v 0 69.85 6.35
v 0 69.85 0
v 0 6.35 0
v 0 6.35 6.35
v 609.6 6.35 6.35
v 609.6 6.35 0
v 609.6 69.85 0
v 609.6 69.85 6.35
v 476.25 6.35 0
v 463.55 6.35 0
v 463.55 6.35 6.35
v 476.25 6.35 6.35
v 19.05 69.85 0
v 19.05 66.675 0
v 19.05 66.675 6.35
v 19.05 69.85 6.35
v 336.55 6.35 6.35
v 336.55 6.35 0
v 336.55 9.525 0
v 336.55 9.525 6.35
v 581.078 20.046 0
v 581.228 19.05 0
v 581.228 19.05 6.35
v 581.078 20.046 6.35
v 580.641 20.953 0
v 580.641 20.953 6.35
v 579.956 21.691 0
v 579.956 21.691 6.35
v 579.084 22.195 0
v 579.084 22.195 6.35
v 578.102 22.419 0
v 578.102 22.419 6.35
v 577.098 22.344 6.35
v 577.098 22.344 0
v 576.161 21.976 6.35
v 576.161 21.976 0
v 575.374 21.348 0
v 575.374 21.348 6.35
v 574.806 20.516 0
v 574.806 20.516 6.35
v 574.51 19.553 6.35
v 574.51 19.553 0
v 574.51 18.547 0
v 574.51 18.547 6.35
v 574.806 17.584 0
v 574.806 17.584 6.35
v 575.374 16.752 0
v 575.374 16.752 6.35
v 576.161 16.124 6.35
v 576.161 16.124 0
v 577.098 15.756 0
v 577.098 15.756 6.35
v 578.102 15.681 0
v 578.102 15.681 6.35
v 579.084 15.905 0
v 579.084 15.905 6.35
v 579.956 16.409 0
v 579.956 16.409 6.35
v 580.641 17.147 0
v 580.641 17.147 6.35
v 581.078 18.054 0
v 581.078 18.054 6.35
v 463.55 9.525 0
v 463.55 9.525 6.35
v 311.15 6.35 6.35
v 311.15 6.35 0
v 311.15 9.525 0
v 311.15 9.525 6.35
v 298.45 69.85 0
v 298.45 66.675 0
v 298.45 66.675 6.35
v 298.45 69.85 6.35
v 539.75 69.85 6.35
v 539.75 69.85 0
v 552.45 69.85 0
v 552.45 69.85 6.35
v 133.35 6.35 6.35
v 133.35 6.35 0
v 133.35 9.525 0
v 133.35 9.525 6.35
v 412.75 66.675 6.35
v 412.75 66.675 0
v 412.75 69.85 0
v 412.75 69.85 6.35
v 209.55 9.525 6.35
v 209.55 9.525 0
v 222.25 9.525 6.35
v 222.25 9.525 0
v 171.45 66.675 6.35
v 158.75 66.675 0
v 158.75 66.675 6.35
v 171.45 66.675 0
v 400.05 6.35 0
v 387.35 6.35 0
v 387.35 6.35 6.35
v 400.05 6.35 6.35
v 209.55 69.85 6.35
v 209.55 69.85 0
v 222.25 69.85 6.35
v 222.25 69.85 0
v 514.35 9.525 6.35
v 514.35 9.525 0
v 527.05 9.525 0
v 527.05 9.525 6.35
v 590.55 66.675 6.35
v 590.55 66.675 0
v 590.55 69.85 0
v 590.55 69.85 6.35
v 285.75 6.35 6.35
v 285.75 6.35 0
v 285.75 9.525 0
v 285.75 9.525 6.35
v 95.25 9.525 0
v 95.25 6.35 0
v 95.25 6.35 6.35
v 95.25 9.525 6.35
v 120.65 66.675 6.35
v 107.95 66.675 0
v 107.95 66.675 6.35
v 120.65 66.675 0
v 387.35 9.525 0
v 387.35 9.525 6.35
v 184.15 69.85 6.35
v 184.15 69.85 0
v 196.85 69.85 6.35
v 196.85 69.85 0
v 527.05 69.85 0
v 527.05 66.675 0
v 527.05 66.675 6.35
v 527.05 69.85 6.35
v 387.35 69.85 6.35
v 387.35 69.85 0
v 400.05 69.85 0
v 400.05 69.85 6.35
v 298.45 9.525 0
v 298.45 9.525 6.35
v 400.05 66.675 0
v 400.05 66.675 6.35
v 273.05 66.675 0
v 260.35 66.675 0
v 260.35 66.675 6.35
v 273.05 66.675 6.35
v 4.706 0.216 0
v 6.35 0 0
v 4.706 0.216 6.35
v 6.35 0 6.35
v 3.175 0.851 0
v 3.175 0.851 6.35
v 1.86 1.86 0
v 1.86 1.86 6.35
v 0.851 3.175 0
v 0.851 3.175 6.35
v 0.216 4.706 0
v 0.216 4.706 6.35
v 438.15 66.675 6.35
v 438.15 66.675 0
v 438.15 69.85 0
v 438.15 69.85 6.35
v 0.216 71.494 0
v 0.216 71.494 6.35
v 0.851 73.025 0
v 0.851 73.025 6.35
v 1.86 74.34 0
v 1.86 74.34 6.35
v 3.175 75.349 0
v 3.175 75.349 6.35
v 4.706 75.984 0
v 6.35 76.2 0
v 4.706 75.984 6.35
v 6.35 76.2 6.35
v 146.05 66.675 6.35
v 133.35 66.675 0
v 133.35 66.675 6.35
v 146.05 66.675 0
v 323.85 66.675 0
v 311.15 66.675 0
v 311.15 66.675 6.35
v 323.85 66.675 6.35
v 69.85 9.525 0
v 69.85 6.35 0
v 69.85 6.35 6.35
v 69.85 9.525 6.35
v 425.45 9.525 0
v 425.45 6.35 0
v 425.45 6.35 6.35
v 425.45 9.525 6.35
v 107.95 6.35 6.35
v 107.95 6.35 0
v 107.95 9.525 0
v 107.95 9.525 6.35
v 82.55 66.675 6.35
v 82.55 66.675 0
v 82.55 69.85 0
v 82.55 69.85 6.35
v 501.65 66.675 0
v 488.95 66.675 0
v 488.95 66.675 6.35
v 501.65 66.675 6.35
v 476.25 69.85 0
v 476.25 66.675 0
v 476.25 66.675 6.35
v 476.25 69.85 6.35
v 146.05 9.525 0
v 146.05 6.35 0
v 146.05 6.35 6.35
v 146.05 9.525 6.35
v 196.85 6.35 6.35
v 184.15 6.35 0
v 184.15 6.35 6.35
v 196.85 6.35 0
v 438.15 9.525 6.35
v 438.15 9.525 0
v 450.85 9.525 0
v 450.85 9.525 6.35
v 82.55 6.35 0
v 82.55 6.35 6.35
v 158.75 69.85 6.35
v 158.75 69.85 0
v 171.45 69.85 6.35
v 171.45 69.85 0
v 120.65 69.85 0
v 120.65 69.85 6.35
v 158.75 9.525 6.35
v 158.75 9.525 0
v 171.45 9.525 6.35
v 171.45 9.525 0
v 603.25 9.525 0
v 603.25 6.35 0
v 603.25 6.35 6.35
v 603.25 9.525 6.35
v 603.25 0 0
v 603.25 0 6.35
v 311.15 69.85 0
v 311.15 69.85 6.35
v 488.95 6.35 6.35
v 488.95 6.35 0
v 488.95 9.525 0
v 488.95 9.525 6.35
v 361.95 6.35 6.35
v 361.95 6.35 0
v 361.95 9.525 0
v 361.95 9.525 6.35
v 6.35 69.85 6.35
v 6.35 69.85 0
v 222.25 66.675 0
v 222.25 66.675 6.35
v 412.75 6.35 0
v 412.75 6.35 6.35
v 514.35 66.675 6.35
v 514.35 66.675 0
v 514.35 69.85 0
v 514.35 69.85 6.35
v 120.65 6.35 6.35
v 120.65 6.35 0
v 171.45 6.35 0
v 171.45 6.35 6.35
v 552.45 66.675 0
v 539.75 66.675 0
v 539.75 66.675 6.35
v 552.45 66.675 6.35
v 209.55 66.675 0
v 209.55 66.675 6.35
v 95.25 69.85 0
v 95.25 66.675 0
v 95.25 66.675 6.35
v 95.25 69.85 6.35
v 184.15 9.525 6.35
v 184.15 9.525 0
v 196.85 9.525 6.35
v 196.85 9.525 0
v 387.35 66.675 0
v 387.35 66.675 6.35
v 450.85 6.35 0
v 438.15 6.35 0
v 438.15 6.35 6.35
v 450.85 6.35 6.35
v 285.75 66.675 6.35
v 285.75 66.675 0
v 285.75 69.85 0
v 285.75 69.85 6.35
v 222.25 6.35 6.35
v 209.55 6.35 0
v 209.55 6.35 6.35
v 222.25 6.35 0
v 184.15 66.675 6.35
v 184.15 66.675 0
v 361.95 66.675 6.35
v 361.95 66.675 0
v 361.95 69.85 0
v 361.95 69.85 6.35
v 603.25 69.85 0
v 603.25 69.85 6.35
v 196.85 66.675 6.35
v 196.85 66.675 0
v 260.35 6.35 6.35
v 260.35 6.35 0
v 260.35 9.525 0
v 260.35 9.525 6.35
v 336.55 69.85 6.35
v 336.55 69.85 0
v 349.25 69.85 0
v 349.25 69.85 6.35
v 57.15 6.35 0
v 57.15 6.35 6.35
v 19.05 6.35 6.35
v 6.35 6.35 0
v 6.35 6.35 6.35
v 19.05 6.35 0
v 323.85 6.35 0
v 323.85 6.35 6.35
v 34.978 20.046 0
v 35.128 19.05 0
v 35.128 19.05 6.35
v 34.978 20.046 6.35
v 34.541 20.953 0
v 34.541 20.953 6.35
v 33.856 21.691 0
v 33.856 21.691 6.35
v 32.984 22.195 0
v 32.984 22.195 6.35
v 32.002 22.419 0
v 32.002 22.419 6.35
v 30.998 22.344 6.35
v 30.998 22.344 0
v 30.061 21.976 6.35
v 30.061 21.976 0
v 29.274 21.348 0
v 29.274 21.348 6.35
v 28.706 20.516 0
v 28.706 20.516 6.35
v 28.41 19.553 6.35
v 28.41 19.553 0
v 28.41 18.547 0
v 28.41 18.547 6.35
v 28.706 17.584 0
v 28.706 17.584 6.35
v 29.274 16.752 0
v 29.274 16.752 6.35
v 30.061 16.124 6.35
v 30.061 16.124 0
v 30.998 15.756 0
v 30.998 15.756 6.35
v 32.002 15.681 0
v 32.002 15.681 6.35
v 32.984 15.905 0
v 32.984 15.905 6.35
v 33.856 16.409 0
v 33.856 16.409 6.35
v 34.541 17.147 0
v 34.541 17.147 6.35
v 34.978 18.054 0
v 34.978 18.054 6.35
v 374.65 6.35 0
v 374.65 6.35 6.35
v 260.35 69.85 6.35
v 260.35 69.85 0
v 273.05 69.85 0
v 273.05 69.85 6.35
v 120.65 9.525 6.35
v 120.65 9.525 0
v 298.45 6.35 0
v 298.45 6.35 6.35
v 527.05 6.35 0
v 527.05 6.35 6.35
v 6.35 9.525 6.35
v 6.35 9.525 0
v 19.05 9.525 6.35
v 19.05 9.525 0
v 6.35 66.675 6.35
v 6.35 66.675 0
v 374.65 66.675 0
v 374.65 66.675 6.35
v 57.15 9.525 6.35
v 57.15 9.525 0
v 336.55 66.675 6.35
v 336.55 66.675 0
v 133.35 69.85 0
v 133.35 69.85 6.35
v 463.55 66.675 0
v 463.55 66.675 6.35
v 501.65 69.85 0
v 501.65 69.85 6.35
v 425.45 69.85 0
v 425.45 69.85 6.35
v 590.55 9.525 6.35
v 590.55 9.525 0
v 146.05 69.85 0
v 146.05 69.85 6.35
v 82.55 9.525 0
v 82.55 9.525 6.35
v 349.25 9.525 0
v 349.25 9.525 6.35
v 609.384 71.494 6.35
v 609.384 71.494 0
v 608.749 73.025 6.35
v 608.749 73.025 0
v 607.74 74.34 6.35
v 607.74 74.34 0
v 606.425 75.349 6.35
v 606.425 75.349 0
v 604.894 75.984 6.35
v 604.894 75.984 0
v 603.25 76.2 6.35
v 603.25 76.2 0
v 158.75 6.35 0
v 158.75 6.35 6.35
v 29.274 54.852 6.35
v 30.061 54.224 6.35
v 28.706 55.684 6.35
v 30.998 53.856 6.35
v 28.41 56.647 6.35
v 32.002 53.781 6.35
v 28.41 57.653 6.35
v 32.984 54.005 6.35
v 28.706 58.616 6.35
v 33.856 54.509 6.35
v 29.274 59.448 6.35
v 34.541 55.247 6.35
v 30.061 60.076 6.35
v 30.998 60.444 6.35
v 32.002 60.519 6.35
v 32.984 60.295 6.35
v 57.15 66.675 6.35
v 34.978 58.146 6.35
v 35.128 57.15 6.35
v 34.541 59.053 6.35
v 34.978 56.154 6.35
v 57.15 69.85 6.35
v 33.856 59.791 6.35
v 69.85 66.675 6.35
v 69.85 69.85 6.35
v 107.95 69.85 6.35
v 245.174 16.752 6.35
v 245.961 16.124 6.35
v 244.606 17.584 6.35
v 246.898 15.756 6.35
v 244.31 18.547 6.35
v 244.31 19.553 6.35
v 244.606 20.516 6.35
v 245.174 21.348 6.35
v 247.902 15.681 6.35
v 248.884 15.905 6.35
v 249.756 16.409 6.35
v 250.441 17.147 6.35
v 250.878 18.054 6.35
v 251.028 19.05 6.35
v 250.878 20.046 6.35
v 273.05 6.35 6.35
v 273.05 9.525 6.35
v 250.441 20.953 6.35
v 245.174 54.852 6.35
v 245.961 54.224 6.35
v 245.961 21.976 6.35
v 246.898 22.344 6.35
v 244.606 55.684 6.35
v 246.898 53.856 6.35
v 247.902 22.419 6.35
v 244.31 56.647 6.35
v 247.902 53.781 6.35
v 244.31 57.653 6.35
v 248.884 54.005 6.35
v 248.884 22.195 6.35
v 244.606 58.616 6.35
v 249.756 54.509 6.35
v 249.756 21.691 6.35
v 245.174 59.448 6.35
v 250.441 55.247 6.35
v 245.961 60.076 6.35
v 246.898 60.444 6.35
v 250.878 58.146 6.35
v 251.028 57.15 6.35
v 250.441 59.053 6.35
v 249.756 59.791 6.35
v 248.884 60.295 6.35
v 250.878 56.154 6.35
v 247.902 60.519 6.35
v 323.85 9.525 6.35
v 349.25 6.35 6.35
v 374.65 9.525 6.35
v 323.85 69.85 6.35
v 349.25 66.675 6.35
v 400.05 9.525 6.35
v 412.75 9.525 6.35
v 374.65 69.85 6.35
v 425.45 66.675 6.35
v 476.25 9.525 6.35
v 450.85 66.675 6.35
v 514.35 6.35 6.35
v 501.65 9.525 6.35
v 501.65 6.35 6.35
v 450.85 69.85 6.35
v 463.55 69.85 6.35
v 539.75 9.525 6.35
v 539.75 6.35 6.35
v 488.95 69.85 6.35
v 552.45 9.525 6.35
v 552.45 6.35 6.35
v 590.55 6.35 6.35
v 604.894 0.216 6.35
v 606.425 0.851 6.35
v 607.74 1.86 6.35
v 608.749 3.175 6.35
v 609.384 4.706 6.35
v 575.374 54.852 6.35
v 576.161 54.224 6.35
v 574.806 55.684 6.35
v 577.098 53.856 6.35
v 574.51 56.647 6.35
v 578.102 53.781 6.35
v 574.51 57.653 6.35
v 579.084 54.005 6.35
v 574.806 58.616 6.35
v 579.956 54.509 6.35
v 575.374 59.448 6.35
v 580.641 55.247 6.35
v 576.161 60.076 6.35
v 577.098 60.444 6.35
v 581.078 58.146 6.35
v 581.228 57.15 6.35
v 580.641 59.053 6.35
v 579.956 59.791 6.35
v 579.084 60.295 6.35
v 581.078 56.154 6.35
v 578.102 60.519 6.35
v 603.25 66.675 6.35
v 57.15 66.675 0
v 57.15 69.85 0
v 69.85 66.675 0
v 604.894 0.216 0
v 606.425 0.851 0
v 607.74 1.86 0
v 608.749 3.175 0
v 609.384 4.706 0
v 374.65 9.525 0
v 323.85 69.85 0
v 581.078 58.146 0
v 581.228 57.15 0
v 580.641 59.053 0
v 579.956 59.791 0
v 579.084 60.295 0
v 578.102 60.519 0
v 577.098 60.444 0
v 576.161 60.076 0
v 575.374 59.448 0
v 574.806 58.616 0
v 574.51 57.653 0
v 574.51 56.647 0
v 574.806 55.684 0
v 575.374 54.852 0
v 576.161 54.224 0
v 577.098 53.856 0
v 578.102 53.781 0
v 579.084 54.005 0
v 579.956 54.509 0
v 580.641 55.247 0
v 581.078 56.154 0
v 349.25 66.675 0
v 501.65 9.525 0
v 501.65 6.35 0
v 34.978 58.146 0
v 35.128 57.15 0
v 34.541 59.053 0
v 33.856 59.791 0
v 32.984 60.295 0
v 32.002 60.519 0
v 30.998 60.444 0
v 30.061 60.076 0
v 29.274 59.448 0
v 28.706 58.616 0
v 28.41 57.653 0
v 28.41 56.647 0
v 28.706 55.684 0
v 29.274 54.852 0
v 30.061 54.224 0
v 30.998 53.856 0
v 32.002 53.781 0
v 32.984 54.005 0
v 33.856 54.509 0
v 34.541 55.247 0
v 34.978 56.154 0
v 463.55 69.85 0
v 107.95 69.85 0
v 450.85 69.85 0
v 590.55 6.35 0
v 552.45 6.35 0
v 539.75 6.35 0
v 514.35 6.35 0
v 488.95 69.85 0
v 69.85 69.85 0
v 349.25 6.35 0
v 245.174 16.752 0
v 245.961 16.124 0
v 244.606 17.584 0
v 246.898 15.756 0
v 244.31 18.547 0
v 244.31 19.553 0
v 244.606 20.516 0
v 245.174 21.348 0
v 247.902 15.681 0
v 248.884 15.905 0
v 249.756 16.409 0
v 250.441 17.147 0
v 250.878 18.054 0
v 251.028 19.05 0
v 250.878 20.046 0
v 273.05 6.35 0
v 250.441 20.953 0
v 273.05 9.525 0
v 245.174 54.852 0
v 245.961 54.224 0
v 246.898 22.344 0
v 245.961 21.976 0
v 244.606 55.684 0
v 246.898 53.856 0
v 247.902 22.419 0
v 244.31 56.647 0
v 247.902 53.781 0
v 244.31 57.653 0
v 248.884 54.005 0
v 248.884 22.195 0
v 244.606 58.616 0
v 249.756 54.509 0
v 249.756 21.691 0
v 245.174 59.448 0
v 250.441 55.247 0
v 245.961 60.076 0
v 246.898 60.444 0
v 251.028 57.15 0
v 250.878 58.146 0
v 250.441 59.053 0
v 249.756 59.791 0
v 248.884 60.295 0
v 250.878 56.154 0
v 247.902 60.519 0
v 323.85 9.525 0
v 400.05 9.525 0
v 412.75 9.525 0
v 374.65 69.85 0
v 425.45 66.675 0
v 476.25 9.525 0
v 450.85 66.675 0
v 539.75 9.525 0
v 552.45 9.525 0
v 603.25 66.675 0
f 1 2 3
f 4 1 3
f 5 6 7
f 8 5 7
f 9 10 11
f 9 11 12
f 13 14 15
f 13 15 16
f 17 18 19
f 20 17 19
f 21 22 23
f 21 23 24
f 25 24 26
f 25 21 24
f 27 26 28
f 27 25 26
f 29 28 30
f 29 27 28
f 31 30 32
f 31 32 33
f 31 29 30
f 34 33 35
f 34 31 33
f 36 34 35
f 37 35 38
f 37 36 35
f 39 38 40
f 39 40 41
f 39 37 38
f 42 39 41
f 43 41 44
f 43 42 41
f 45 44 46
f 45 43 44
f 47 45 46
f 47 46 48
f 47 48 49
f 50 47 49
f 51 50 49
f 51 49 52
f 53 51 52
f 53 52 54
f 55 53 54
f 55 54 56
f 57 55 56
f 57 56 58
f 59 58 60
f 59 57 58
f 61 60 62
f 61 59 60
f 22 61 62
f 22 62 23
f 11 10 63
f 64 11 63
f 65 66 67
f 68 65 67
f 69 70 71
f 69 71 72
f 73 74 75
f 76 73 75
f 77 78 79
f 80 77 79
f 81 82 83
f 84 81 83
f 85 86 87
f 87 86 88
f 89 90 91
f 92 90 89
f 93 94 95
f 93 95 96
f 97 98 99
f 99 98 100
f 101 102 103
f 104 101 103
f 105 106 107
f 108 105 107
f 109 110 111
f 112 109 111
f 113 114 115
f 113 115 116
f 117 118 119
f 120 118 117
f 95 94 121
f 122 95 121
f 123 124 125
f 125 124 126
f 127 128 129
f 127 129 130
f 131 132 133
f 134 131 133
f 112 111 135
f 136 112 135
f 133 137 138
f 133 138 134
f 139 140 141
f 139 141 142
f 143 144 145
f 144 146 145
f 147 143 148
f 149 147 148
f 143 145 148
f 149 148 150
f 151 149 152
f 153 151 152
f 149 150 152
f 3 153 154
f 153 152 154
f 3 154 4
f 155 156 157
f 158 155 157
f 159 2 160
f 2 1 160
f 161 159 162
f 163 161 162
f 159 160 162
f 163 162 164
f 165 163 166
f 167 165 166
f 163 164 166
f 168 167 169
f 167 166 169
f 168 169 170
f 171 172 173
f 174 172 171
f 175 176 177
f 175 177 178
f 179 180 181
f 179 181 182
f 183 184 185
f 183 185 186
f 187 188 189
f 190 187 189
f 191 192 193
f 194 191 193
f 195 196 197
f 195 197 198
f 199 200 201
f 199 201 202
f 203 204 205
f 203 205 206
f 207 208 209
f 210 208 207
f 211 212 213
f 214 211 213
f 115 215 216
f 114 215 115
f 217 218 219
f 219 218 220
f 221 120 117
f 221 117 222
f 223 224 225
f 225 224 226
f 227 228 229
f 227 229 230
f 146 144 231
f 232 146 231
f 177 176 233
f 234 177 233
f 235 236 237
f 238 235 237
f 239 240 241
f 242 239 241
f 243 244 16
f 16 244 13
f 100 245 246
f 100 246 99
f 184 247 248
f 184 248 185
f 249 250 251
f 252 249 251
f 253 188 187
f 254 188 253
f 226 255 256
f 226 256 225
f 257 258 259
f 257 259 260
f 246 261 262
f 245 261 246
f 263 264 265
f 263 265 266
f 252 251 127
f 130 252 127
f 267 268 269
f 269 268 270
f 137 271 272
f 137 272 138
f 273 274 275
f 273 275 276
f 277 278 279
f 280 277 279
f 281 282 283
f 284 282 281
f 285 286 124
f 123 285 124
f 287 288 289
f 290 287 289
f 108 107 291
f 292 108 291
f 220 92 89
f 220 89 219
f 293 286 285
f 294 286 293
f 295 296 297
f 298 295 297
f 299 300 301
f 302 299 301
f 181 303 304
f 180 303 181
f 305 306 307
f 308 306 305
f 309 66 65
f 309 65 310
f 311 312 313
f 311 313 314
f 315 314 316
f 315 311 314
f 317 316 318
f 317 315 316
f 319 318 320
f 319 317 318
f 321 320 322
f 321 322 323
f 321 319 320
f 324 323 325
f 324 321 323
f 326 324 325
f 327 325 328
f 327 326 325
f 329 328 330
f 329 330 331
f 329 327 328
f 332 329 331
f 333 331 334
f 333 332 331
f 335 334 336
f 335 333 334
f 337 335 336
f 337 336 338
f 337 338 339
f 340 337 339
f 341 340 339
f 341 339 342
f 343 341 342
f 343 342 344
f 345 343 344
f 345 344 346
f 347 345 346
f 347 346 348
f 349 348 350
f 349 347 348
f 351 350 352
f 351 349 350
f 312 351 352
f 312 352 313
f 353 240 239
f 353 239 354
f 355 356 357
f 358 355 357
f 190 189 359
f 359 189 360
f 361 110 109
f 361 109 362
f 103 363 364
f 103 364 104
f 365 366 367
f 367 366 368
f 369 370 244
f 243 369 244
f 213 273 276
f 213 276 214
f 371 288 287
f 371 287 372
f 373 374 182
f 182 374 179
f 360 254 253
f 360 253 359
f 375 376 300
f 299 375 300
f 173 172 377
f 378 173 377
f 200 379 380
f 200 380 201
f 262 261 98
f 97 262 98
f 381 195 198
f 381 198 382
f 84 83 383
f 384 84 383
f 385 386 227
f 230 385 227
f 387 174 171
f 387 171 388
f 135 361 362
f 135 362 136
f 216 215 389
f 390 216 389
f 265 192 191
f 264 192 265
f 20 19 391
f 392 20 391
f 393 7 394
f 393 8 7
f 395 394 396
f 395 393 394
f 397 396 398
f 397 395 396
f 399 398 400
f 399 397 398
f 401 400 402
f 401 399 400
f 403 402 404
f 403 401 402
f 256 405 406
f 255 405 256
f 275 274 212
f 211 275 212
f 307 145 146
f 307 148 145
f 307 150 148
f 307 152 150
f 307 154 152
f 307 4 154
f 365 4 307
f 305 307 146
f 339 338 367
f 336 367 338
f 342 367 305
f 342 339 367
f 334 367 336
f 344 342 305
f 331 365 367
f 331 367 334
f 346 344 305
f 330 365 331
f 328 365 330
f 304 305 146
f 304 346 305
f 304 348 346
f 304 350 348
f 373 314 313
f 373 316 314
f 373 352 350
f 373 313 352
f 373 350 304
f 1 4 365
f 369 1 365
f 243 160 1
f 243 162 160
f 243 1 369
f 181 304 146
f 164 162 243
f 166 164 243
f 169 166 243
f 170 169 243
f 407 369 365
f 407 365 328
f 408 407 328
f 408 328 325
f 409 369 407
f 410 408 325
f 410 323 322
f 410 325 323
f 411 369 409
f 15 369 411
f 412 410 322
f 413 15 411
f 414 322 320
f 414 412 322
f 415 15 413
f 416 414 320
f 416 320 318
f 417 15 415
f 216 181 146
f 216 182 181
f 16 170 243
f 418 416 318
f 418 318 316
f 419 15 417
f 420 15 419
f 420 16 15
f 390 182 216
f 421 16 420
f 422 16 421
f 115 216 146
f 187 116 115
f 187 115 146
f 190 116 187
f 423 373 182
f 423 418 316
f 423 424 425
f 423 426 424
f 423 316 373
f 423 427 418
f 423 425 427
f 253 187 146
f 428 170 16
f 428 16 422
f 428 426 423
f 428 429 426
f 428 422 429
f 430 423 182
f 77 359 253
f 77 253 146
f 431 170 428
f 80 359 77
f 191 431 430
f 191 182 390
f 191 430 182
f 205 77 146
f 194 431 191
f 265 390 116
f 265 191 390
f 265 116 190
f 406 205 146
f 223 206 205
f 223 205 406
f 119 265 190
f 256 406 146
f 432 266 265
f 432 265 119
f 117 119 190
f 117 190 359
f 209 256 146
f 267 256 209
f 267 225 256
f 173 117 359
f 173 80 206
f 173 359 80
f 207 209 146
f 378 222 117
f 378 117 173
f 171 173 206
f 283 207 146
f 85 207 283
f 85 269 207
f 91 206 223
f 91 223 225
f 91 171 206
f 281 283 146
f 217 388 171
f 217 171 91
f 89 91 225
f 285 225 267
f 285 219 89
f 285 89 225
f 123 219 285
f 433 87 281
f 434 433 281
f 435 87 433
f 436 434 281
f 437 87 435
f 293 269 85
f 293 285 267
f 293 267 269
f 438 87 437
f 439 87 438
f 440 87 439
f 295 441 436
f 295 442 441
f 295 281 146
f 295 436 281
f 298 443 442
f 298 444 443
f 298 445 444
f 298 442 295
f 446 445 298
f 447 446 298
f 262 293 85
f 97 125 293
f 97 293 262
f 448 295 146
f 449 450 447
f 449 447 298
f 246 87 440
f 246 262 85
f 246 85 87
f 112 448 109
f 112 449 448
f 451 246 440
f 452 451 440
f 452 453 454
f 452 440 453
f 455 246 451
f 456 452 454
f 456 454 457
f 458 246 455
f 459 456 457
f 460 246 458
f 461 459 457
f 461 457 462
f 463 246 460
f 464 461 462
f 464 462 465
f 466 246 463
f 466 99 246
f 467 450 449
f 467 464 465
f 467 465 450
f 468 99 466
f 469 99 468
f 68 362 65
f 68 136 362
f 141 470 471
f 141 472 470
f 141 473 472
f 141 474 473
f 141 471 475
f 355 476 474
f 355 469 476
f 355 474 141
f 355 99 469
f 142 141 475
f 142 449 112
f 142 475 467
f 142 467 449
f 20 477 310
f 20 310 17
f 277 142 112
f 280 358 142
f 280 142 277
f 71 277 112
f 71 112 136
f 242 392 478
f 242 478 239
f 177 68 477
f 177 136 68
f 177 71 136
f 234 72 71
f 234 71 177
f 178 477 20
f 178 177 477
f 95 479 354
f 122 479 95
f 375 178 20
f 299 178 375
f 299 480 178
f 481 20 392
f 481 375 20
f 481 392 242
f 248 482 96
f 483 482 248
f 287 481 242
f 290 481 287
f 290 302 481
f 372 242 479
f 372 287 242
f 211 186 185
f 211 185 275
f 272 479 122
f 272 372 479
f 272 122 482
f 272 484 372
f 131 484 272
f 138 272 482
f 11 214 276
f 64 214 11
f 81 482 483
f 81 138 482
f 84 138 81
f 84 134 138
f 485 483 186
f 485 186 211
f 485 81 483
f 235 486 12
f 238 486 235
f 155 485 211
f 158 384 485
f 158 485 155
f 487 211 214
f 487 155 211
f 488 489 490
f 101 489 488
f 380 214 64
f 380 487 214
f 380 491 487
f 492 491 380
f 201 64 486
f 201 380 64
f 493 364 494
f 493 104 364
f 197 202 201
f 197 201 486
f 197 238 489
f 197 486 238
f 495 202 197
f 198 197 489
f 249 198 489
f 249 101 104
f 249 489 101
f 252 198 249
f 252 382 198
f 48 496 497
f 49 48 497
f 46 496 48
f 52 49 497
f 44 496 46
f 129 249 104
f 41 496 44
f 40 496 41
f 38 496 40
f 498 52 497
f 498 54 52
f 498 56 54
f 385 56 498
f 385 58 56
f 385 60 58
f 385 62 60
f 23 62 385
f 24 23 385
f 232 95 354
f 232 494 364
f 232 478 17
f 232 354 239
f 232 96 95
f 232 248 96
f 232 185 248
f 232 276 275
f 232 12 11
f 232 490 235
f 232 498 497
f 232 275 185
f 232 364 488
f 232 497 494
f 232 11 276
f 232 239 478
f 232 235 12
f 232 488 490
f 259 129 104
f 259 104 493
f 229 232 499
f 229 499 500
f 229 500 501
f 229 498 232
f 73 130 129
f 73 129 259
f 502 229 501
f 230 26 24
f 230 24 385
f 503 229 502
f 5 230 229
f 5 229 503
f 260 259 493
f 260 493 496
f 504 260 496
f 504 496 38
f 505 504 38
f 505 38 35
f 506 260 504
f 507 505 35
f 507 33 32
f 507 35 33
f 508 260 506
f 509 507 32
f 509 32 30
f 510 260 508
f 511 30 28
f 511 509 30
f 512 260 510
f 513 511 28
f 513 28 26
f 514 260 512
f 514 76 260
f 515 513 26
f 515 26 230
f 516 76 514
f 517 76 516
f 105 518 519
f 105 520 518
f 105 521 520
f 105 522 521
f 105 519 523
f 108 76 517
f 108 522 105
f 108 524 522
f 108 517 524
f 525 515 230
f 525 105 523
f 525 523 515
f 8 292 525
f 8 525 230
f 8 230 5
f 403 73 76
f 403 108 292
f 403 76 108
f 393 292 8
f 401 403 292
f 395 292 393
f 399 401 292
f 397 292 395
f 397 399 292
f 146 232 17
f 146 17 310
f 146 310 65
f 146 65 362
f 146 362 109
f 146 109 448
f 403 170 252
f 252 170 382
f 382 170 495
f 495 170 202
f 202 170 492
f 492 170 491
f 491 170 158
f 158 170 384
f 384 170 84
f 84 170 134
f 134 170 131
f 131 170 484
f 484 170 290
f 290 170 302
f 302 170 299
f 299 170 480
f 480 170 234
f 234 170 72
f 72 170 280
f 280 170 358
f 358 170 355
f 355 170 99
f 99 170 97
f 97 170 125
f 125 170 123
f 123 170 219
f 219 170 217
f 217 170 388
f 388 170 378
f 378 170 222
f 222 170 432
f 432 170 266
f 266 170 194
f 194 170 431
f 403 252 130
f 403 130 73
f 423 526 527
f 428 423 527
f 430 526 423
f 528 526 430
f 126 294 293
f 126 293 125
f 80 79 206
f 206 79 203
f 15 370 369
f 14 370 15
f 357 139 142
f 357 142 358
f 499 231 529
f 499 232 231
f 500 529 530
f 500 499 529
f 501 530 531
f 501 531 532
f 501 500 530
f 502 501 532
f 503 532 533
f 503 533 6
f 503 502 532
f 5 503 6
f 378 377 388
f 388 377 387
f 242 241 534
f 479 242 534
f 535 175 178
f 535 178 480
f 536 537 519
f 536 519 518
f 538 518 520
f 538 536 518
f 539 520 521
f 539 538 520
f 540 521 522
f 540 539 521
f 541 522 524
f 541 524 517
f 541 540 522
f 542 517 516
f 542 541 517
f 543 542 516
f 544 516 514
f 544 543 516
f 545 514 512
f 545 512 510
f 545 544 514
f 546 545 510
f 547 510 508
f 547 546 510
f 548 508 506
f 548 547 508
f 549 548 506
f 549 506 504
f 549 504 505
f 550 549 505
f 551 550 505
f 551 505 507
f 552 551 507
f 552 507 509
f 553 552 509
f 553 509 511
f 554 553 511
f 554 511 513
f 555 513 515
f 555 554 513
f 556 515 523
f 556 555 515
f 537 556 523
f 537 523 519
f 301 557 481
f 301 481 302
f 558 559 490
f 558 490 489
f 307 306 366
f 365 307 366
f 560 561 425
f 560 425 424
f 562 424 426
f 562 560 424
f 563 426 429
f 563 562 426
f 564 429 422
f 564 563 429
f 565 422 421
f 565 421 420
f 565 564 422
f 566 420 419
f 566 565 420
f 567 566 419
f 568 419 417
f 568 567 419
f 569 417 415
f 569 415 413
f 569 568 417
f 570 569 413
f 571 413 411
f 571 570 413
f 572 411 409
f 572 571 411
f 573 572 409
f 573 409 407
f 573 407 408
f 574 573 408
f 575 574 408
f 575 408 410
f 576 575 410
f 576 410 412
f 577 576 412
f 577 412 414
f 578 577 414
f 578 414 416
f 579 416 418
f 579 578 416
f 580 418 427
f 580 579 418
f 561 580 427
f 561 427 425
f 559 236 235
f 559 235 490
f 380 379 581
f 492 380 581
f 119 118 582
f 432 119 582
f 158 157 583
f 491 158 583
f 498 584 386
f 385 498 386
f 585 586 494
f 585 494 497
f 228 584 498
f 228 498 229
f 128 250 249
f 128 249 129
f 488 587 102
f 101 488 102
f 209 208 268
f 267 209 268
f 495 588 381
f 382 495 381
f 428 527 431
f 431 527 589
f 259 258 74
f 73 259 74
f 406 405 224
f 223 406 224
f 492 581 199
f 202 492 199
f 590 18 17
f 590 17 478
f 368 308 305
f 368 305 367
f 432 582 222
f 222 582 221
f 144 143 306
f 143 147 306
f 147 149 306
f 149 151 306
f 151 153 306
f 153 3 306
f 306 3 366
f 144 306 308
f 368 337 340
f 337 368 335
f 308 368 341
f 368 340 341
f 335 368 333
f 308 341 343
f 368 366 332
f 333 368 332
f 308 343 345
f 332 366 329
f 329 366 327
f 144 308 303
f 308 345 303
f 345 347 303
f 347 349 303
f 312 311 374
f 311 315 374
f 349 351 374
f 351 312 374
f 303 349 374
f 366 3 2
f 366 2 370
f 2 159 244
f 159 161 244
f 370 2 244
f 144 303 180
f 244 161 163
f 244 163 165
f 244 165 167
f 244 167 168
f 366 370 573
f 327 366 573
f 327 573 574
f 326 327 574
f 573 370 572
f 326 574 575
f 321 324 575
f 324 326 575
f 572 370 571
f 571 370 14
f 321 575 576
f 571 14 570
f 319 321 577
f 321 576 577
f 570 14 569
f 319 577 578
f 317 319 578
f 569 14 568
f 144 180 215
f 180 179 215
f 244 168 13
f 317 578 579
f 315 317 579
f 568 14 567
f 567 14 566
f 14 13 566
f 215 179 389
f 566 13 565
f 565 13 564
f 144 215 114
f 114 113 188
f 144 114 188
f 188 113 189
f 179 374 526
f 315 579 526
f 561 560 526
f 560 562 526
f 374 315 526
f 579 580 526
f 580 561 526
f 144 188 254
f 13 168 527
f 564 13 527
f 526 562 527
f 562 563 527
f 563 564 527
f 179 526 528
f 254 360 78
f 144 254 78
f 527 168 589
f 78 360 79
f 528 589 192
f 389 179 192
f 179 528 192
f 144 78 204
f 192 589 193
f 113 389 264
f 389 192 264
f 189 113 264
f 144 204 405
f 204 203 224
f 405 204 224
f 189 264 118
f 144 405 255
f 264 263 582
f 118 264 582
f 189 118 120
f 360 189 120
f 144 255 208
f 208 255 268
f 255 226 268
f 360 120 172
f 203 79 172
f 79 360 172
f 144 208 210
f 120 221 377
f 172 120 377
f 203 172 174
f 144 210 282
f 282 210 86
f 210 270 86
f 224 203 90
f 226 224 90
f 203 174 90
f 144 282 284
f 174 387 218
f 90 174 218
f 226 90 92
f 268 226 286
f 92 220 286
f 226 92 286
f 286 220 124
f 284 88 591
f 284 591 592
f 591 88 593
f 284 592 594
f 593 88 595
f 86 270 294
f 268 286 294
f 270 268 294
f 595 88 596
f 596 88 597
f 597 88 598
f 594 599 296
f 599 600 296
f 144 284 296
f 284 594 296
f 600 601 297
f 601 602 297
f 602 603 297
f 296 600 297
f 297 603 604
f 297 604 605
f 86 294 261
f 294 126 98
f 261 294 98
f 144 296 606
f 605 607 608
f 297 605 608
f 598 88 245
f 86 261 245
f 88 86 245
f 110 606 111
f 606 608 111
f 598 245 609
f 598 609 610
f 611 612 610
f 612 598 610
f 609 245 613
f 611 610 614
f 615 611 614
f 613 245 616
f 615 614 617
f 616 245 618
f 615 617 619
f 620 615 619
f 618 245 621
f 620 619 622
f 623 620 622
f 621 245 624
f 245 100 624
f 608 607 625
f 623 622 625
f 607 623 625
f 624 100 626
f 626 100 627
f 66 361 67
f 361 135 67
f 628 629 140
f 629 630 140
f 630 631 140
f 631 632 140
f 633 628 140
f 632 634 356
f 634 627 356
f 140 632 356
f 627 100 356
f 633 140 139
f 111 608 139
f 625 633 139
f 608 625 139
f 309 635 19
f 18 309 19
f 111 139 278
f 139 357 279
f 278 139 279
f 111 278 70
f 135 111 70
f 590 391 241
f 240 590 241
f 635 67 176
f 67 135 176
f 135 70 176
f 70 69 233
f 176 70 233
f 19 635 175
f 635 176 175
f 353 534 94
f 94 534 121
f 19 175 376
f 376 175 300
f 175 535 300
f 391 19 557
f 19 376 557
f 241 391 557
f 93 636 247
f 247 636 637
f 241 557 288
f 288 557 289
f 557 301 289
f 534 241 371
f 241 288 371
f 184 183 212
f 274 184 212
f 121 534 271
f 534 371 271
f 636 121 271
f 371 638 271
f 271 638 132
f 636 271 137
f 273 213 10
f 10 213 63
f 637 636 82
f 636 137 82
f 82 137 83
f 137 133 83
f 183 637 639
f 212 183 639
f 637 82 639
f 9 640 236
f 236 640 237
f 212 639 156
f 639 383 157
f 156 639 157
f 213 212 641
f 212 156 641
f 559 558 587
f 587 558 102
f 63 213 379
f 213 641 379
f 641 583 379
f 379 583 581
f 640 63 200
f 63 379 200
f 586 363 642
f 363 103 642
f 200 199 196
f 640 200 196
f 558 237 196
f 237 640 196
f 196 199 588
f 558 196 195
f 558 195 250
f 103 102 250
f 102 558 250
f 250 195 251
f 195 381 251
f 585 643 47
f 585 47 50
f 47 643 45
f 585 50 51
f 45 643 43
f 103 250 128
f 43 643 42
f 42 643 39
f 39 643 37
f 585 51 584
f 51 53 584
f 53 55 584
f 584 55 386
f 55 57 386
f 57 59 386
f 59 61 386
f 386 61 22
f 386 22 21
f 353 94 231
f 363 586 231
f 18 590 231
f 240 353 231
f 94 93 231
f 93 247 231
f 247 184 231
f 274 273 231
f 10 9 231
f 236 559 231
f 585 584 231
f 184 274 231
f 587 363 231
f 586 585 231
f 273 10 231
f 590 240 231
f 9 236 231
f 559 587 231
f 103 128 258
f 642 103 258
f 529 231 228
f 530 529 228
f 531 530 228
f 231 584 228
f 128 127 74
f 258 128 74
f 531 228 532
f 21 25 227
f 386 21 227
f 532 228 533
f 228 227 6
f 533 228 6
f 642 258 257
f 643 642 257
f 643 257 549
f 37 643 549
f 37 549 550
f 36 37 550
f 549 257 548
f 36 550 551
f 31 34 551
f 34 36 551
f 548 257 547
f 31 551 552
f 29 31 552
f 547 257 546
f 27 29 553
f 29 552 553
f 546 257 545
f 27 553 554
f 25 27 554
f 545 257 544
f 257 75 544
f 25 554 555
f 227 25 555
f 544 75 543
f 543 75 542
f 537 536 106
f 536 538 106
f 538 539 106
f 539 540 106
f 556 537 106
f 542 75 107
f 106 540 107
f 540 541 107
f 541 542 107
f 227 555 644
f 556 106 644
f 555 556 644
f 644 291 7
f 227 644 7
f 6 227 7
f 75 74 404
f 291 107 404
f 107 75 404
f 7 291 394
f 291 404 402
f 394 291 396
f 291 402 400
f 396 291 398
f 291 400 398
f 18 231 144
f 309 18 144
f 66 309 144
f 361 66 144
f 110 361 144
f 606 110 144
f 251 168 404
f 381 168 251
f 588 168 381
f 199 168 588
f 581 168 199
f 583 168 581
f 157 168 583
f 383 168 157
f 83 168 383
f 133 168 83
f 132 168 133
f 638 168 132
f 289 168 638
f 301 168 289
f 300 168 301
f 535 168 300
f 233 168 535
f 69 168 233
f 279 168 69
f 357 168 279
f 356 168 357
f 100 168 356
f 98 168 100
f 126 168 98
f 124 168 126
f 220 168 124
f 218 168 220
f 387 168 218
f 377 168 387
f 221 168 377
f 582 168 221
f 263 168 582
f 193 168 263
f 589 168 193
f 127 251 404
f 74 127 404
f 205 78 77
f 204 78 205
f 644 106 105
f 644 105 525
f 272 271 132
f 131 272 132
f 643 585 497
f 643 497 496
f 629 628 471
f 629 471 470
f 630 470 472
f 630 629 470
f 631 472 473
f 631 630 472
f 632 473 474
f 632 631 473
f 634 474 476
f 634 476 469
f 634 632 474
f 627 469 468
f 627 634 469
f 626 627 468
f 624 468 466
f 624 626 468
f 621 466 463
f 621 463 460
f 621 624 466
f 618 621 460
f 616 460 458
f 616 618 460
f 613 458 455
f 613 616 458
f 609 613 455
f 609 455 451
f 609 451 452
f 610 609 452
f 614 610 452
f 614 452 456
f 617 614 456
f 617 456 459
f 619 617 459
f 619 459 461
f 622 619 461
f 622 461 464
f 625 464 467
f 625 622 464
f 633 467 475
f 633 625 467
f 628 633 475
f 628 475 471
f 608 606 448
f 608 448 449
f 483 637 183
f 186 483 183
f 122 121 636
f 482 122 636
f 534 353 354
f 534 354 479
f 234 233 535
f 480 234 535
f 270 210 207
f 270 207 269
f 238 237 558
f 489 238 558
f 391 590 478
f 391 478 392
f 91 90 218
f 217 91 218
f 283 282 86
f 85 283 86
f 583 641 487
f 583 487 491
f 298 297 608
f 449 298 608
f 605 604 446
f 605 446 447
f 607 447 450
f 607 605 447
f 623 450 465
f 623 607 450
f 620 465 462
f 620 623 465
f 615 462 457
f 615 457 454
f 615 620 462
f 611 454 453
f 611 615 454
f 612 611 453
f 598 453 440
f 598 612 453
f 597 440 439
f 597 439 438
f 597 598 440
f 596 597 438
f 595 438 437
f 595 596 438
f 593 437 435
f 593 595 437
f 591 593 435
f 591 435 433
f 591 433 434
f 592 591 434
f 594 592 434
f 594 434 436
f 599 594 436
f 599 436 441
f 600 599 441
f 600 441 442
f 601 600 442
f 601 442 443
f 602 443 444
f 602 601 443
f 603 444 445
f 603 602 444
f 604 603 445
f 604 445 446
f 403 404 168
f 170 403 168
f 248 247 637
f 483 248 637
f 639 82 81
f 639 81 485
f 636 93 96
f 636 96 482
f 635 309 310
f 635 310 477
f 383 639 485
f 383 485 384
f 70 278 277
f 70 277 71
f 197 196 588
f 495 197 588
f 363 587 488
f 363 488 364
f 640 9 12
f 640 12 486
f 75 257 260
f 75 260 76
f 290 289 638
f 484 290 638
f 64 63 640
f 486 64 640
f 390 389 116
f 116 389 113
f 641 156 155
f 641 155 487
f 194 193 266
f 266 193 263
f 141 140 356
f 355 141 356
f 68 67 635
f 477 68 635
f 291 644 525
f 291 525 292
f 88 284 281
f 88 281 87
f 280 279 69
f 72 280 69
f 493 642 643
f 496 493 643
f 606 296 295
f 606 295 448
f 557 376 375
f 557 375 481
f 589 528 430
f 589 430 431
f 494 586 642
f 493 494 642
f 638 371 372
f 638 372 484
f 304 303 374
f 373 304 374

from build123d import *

# Parameters (mm, degrees)
F0_W     = 12.7
F0_H     = 3.175
F0_R     = 3.3782
F1_DEPTH = 6.35
F2_R     = 6.35


with BuildPart() as f1:
    # F0 (on Top) → F1 (new body)
    with BuildSketch(Plane.XY):
        Polygon((0, 69.85), (0, 0), (609.6, 0), (609.6, 76.2), (0, 76.2), align=None)
        with Locations((12.7, 7.9375)):
            Rectangle(F0_W, F0_H, mode=Mode.SUBTRACT)
        with Locations((63.5, 7.9375)):
            Rectangle(F0_W, F0_H, mode=Mode.SUBTRACT)
        with Locations((88.9, 7.9375)):
            Rectangle(F0_W, F0_H, mode=Mode.SUBTRACT)
        with Locations((114.3, 7.9375)):
            Rectangle(F0_W, F0_H, mode=Mode.SUBTRACT)
        with Locations((139.7, 7.9375)):
            Rectangle(F0_W, F0_H, mode=Mode.SUBTRACT)
        with Locations((165.1, 7.9375)):
            Rectangle(F0_W, F0_H, mode=Mode.SUBTRACT)
        with Locations((190.5, 7.9375)):
            Rectangle(F0_W, F0_H, mode=Mode.SUBTRACT)
        with Locations((215.9, 7.9375)):
            Rectangle(F0_W, F0_H, mode=Mode.SUBTRACT)
        with Locations((266.7, 7.9375)):
            Rectangle(F0_W, F0_H, mode=Mode.SUBTRACT)
        with Locations((292.1, 7.9375)):
            Rectangle(F0_W, F0_H, mode=Mode.SUBTRACT)
        with Locations((31.75, 19.05)):
            Circle(F0_R, mode=Mode.SUBTRACT)
        with Locations((247.65, 19.05)):
            Circle(F0_R, mode=Mode.SUBTRACT)
        with Locations((317.5, 7.9375)):
            Rectangle(F0_W, F0_H, mode=Mode.SUBTRACT)
        with Locations((342.9, 7.9375)):
            Rectangle(F0_W, F0_H, mode=Mode.SUBTRACT)
        with Locations((368.3, 7.9375)):
            Rectangle(F0_W, F0_H, mode=Mode.SUBTRACT)
        with Locations((393.7, 7.9375)):
            Rectangle(F0_W, F0_H, mode=Mode.SUBTRACT)
        with Locations((419.1, 7.9375)):
            Rectangle(F0_W, F0_H, mode=Mode.SUBTRACT)
        with Locations((444.5, 7.9375)):
            Rectangle(F0_W, F0_H, mode=Mode.SUBTRACT)
        with Locations((469.9, 7.9375)):
            Rectangle(F0_W, F0_H, mode=Mode.SUBTRACT)
        with Locations((495.3, 7.9375)):
            Rectangle(F0_W, F0_H, mode=Mode.SUBTRACT)
        with Locations((520.7, 7.9375)):
            Rectangle(F0_W, F0_H, mode=Mode.SUBTRACT)
        with Locations((546.1, 7.9375)):
            Rectangle(F0_W, F0_H, mode=Mode.SUBTRACT)
        with Locations((596.9, 7.9375)):
            Rectangle(F0_W, F0_H, mode=Mode.SUBTRACT)
        with Locations((577.85, 19.05)):
            Circle(F0_R, mode=Mode.SUBTRACT)
        with Locations((31.75, 57.15)):
            Circle(F0_R, mode=Mode.SUBTRACT)
        with Locations((12.7, 68.2625)):
            Rectangle(F0_W, F0_H, mode=Mode.SUBTRACT)
        with Locations((63.5, 68.2625)):
            Rectangle(F0_W, F0_H, mode=Mode.SUBTRACT)
        with Locations((88.9, 68.2625)):
            Rectangle(F0_W, F0_H, mode=Mode.SUBTRACT)
        with Locations((114.3, 68.2625)):
            Rectangle(F0_W, F0_H, mode=Mode.SUBTRACT)
        with Locations((139.7, 68.2625)):
            Rectangle(F0_W, F0_H, mode=Mode.SUBTRACT)
        with Locations((247.65, 57.15)):
            Circle(F0_R, mode=Mode.SUBTRACT)
        with Locations((165.1, 68.2625)):
            Rectangle(F0_W, F0_H, mode=Mode.SUBTRACT)
        with Locations((190.5, 68.2625)):
            Rectangle(F0_W, F0_H, mode=Mode.SUBTRACT)
        with Locations((215.9, 68.2625)):
            Rectangle(F0_W, F0_H, mode=Mode.SUBTRACT)
        with Locations((266.7, 68.2625)):
            Rectangle(F0_W, F0_H, mode=Mode.SUBTRACT)
        with Locations((292.1, 68.2625)):
            Rectangle(F0_W, F0_H, mode=Mode.SUBTRACT)
        with Locations((317.5, 68.2625)):
            Rectangle(F0_W, F0_H, mode=Mode.SUBTRACT)
        with Locations((342.9, 68.2625)):
            Rectangle(F0_W, F0_H, mode=Mode.SUBTRACT)
        with Locations((368.3, 68.2625)):
            Rectangle(F0_W, F0_H, mode=Mode.SUBTRACT)
        with Locations((393.7, 68.2625)):
            Rectangle(F0_W, F0_H, mode=Mode.SUBTRACT)
        with Locations((419.1, 68.2625)):
            Rectangle(F0_W, F0_H, mode=Mode.SUBTRACT)
        with Locations((444.5, 68.2625)):
            Rectangle(F0_W, F0_H, mode=Mode.SUBTRACT)
        with Locations((577.85, 57.15)):
            Circle(F0_R, mode=Mode.SUBTRACT)
        with Locations((469.9, 68.2625)):
            Rectangle(F0_W, F0_H, mode=Mode.SUBTRACT)
        with Locations((495.3, 68.2625)):
            Rectangle(F0_W, F0_H, mode=Mode.SUBTRACT)
        with Locations((520.7, 68.2625)):
            Rectangle(F0_W, F0_H, mode=Mode.SUBTRACT)
        with Locations((546.1, 68.2625)):
            Rectangle(F0_W, F0_H, mode=Mode.SUBTRACT)
        with Locations((596.9, 68.2625)):
            Rectangle(F0_W, F0_H, mode=Mode.SUBTRACT)
    extrude(amount=F1_DEPTH)

    # F2
    f2_edges = [f1.edges().sort_by_distance(p)[0] for p in [
        (609.6, 76.2, 3.175),
        (609.6, 0, 3.175),
        (0, 76.2, 3.175),
        (0, 0, 3.175),
    ]]
    fillet(f2_edges, radius=F2_R)


solid = f1.part
